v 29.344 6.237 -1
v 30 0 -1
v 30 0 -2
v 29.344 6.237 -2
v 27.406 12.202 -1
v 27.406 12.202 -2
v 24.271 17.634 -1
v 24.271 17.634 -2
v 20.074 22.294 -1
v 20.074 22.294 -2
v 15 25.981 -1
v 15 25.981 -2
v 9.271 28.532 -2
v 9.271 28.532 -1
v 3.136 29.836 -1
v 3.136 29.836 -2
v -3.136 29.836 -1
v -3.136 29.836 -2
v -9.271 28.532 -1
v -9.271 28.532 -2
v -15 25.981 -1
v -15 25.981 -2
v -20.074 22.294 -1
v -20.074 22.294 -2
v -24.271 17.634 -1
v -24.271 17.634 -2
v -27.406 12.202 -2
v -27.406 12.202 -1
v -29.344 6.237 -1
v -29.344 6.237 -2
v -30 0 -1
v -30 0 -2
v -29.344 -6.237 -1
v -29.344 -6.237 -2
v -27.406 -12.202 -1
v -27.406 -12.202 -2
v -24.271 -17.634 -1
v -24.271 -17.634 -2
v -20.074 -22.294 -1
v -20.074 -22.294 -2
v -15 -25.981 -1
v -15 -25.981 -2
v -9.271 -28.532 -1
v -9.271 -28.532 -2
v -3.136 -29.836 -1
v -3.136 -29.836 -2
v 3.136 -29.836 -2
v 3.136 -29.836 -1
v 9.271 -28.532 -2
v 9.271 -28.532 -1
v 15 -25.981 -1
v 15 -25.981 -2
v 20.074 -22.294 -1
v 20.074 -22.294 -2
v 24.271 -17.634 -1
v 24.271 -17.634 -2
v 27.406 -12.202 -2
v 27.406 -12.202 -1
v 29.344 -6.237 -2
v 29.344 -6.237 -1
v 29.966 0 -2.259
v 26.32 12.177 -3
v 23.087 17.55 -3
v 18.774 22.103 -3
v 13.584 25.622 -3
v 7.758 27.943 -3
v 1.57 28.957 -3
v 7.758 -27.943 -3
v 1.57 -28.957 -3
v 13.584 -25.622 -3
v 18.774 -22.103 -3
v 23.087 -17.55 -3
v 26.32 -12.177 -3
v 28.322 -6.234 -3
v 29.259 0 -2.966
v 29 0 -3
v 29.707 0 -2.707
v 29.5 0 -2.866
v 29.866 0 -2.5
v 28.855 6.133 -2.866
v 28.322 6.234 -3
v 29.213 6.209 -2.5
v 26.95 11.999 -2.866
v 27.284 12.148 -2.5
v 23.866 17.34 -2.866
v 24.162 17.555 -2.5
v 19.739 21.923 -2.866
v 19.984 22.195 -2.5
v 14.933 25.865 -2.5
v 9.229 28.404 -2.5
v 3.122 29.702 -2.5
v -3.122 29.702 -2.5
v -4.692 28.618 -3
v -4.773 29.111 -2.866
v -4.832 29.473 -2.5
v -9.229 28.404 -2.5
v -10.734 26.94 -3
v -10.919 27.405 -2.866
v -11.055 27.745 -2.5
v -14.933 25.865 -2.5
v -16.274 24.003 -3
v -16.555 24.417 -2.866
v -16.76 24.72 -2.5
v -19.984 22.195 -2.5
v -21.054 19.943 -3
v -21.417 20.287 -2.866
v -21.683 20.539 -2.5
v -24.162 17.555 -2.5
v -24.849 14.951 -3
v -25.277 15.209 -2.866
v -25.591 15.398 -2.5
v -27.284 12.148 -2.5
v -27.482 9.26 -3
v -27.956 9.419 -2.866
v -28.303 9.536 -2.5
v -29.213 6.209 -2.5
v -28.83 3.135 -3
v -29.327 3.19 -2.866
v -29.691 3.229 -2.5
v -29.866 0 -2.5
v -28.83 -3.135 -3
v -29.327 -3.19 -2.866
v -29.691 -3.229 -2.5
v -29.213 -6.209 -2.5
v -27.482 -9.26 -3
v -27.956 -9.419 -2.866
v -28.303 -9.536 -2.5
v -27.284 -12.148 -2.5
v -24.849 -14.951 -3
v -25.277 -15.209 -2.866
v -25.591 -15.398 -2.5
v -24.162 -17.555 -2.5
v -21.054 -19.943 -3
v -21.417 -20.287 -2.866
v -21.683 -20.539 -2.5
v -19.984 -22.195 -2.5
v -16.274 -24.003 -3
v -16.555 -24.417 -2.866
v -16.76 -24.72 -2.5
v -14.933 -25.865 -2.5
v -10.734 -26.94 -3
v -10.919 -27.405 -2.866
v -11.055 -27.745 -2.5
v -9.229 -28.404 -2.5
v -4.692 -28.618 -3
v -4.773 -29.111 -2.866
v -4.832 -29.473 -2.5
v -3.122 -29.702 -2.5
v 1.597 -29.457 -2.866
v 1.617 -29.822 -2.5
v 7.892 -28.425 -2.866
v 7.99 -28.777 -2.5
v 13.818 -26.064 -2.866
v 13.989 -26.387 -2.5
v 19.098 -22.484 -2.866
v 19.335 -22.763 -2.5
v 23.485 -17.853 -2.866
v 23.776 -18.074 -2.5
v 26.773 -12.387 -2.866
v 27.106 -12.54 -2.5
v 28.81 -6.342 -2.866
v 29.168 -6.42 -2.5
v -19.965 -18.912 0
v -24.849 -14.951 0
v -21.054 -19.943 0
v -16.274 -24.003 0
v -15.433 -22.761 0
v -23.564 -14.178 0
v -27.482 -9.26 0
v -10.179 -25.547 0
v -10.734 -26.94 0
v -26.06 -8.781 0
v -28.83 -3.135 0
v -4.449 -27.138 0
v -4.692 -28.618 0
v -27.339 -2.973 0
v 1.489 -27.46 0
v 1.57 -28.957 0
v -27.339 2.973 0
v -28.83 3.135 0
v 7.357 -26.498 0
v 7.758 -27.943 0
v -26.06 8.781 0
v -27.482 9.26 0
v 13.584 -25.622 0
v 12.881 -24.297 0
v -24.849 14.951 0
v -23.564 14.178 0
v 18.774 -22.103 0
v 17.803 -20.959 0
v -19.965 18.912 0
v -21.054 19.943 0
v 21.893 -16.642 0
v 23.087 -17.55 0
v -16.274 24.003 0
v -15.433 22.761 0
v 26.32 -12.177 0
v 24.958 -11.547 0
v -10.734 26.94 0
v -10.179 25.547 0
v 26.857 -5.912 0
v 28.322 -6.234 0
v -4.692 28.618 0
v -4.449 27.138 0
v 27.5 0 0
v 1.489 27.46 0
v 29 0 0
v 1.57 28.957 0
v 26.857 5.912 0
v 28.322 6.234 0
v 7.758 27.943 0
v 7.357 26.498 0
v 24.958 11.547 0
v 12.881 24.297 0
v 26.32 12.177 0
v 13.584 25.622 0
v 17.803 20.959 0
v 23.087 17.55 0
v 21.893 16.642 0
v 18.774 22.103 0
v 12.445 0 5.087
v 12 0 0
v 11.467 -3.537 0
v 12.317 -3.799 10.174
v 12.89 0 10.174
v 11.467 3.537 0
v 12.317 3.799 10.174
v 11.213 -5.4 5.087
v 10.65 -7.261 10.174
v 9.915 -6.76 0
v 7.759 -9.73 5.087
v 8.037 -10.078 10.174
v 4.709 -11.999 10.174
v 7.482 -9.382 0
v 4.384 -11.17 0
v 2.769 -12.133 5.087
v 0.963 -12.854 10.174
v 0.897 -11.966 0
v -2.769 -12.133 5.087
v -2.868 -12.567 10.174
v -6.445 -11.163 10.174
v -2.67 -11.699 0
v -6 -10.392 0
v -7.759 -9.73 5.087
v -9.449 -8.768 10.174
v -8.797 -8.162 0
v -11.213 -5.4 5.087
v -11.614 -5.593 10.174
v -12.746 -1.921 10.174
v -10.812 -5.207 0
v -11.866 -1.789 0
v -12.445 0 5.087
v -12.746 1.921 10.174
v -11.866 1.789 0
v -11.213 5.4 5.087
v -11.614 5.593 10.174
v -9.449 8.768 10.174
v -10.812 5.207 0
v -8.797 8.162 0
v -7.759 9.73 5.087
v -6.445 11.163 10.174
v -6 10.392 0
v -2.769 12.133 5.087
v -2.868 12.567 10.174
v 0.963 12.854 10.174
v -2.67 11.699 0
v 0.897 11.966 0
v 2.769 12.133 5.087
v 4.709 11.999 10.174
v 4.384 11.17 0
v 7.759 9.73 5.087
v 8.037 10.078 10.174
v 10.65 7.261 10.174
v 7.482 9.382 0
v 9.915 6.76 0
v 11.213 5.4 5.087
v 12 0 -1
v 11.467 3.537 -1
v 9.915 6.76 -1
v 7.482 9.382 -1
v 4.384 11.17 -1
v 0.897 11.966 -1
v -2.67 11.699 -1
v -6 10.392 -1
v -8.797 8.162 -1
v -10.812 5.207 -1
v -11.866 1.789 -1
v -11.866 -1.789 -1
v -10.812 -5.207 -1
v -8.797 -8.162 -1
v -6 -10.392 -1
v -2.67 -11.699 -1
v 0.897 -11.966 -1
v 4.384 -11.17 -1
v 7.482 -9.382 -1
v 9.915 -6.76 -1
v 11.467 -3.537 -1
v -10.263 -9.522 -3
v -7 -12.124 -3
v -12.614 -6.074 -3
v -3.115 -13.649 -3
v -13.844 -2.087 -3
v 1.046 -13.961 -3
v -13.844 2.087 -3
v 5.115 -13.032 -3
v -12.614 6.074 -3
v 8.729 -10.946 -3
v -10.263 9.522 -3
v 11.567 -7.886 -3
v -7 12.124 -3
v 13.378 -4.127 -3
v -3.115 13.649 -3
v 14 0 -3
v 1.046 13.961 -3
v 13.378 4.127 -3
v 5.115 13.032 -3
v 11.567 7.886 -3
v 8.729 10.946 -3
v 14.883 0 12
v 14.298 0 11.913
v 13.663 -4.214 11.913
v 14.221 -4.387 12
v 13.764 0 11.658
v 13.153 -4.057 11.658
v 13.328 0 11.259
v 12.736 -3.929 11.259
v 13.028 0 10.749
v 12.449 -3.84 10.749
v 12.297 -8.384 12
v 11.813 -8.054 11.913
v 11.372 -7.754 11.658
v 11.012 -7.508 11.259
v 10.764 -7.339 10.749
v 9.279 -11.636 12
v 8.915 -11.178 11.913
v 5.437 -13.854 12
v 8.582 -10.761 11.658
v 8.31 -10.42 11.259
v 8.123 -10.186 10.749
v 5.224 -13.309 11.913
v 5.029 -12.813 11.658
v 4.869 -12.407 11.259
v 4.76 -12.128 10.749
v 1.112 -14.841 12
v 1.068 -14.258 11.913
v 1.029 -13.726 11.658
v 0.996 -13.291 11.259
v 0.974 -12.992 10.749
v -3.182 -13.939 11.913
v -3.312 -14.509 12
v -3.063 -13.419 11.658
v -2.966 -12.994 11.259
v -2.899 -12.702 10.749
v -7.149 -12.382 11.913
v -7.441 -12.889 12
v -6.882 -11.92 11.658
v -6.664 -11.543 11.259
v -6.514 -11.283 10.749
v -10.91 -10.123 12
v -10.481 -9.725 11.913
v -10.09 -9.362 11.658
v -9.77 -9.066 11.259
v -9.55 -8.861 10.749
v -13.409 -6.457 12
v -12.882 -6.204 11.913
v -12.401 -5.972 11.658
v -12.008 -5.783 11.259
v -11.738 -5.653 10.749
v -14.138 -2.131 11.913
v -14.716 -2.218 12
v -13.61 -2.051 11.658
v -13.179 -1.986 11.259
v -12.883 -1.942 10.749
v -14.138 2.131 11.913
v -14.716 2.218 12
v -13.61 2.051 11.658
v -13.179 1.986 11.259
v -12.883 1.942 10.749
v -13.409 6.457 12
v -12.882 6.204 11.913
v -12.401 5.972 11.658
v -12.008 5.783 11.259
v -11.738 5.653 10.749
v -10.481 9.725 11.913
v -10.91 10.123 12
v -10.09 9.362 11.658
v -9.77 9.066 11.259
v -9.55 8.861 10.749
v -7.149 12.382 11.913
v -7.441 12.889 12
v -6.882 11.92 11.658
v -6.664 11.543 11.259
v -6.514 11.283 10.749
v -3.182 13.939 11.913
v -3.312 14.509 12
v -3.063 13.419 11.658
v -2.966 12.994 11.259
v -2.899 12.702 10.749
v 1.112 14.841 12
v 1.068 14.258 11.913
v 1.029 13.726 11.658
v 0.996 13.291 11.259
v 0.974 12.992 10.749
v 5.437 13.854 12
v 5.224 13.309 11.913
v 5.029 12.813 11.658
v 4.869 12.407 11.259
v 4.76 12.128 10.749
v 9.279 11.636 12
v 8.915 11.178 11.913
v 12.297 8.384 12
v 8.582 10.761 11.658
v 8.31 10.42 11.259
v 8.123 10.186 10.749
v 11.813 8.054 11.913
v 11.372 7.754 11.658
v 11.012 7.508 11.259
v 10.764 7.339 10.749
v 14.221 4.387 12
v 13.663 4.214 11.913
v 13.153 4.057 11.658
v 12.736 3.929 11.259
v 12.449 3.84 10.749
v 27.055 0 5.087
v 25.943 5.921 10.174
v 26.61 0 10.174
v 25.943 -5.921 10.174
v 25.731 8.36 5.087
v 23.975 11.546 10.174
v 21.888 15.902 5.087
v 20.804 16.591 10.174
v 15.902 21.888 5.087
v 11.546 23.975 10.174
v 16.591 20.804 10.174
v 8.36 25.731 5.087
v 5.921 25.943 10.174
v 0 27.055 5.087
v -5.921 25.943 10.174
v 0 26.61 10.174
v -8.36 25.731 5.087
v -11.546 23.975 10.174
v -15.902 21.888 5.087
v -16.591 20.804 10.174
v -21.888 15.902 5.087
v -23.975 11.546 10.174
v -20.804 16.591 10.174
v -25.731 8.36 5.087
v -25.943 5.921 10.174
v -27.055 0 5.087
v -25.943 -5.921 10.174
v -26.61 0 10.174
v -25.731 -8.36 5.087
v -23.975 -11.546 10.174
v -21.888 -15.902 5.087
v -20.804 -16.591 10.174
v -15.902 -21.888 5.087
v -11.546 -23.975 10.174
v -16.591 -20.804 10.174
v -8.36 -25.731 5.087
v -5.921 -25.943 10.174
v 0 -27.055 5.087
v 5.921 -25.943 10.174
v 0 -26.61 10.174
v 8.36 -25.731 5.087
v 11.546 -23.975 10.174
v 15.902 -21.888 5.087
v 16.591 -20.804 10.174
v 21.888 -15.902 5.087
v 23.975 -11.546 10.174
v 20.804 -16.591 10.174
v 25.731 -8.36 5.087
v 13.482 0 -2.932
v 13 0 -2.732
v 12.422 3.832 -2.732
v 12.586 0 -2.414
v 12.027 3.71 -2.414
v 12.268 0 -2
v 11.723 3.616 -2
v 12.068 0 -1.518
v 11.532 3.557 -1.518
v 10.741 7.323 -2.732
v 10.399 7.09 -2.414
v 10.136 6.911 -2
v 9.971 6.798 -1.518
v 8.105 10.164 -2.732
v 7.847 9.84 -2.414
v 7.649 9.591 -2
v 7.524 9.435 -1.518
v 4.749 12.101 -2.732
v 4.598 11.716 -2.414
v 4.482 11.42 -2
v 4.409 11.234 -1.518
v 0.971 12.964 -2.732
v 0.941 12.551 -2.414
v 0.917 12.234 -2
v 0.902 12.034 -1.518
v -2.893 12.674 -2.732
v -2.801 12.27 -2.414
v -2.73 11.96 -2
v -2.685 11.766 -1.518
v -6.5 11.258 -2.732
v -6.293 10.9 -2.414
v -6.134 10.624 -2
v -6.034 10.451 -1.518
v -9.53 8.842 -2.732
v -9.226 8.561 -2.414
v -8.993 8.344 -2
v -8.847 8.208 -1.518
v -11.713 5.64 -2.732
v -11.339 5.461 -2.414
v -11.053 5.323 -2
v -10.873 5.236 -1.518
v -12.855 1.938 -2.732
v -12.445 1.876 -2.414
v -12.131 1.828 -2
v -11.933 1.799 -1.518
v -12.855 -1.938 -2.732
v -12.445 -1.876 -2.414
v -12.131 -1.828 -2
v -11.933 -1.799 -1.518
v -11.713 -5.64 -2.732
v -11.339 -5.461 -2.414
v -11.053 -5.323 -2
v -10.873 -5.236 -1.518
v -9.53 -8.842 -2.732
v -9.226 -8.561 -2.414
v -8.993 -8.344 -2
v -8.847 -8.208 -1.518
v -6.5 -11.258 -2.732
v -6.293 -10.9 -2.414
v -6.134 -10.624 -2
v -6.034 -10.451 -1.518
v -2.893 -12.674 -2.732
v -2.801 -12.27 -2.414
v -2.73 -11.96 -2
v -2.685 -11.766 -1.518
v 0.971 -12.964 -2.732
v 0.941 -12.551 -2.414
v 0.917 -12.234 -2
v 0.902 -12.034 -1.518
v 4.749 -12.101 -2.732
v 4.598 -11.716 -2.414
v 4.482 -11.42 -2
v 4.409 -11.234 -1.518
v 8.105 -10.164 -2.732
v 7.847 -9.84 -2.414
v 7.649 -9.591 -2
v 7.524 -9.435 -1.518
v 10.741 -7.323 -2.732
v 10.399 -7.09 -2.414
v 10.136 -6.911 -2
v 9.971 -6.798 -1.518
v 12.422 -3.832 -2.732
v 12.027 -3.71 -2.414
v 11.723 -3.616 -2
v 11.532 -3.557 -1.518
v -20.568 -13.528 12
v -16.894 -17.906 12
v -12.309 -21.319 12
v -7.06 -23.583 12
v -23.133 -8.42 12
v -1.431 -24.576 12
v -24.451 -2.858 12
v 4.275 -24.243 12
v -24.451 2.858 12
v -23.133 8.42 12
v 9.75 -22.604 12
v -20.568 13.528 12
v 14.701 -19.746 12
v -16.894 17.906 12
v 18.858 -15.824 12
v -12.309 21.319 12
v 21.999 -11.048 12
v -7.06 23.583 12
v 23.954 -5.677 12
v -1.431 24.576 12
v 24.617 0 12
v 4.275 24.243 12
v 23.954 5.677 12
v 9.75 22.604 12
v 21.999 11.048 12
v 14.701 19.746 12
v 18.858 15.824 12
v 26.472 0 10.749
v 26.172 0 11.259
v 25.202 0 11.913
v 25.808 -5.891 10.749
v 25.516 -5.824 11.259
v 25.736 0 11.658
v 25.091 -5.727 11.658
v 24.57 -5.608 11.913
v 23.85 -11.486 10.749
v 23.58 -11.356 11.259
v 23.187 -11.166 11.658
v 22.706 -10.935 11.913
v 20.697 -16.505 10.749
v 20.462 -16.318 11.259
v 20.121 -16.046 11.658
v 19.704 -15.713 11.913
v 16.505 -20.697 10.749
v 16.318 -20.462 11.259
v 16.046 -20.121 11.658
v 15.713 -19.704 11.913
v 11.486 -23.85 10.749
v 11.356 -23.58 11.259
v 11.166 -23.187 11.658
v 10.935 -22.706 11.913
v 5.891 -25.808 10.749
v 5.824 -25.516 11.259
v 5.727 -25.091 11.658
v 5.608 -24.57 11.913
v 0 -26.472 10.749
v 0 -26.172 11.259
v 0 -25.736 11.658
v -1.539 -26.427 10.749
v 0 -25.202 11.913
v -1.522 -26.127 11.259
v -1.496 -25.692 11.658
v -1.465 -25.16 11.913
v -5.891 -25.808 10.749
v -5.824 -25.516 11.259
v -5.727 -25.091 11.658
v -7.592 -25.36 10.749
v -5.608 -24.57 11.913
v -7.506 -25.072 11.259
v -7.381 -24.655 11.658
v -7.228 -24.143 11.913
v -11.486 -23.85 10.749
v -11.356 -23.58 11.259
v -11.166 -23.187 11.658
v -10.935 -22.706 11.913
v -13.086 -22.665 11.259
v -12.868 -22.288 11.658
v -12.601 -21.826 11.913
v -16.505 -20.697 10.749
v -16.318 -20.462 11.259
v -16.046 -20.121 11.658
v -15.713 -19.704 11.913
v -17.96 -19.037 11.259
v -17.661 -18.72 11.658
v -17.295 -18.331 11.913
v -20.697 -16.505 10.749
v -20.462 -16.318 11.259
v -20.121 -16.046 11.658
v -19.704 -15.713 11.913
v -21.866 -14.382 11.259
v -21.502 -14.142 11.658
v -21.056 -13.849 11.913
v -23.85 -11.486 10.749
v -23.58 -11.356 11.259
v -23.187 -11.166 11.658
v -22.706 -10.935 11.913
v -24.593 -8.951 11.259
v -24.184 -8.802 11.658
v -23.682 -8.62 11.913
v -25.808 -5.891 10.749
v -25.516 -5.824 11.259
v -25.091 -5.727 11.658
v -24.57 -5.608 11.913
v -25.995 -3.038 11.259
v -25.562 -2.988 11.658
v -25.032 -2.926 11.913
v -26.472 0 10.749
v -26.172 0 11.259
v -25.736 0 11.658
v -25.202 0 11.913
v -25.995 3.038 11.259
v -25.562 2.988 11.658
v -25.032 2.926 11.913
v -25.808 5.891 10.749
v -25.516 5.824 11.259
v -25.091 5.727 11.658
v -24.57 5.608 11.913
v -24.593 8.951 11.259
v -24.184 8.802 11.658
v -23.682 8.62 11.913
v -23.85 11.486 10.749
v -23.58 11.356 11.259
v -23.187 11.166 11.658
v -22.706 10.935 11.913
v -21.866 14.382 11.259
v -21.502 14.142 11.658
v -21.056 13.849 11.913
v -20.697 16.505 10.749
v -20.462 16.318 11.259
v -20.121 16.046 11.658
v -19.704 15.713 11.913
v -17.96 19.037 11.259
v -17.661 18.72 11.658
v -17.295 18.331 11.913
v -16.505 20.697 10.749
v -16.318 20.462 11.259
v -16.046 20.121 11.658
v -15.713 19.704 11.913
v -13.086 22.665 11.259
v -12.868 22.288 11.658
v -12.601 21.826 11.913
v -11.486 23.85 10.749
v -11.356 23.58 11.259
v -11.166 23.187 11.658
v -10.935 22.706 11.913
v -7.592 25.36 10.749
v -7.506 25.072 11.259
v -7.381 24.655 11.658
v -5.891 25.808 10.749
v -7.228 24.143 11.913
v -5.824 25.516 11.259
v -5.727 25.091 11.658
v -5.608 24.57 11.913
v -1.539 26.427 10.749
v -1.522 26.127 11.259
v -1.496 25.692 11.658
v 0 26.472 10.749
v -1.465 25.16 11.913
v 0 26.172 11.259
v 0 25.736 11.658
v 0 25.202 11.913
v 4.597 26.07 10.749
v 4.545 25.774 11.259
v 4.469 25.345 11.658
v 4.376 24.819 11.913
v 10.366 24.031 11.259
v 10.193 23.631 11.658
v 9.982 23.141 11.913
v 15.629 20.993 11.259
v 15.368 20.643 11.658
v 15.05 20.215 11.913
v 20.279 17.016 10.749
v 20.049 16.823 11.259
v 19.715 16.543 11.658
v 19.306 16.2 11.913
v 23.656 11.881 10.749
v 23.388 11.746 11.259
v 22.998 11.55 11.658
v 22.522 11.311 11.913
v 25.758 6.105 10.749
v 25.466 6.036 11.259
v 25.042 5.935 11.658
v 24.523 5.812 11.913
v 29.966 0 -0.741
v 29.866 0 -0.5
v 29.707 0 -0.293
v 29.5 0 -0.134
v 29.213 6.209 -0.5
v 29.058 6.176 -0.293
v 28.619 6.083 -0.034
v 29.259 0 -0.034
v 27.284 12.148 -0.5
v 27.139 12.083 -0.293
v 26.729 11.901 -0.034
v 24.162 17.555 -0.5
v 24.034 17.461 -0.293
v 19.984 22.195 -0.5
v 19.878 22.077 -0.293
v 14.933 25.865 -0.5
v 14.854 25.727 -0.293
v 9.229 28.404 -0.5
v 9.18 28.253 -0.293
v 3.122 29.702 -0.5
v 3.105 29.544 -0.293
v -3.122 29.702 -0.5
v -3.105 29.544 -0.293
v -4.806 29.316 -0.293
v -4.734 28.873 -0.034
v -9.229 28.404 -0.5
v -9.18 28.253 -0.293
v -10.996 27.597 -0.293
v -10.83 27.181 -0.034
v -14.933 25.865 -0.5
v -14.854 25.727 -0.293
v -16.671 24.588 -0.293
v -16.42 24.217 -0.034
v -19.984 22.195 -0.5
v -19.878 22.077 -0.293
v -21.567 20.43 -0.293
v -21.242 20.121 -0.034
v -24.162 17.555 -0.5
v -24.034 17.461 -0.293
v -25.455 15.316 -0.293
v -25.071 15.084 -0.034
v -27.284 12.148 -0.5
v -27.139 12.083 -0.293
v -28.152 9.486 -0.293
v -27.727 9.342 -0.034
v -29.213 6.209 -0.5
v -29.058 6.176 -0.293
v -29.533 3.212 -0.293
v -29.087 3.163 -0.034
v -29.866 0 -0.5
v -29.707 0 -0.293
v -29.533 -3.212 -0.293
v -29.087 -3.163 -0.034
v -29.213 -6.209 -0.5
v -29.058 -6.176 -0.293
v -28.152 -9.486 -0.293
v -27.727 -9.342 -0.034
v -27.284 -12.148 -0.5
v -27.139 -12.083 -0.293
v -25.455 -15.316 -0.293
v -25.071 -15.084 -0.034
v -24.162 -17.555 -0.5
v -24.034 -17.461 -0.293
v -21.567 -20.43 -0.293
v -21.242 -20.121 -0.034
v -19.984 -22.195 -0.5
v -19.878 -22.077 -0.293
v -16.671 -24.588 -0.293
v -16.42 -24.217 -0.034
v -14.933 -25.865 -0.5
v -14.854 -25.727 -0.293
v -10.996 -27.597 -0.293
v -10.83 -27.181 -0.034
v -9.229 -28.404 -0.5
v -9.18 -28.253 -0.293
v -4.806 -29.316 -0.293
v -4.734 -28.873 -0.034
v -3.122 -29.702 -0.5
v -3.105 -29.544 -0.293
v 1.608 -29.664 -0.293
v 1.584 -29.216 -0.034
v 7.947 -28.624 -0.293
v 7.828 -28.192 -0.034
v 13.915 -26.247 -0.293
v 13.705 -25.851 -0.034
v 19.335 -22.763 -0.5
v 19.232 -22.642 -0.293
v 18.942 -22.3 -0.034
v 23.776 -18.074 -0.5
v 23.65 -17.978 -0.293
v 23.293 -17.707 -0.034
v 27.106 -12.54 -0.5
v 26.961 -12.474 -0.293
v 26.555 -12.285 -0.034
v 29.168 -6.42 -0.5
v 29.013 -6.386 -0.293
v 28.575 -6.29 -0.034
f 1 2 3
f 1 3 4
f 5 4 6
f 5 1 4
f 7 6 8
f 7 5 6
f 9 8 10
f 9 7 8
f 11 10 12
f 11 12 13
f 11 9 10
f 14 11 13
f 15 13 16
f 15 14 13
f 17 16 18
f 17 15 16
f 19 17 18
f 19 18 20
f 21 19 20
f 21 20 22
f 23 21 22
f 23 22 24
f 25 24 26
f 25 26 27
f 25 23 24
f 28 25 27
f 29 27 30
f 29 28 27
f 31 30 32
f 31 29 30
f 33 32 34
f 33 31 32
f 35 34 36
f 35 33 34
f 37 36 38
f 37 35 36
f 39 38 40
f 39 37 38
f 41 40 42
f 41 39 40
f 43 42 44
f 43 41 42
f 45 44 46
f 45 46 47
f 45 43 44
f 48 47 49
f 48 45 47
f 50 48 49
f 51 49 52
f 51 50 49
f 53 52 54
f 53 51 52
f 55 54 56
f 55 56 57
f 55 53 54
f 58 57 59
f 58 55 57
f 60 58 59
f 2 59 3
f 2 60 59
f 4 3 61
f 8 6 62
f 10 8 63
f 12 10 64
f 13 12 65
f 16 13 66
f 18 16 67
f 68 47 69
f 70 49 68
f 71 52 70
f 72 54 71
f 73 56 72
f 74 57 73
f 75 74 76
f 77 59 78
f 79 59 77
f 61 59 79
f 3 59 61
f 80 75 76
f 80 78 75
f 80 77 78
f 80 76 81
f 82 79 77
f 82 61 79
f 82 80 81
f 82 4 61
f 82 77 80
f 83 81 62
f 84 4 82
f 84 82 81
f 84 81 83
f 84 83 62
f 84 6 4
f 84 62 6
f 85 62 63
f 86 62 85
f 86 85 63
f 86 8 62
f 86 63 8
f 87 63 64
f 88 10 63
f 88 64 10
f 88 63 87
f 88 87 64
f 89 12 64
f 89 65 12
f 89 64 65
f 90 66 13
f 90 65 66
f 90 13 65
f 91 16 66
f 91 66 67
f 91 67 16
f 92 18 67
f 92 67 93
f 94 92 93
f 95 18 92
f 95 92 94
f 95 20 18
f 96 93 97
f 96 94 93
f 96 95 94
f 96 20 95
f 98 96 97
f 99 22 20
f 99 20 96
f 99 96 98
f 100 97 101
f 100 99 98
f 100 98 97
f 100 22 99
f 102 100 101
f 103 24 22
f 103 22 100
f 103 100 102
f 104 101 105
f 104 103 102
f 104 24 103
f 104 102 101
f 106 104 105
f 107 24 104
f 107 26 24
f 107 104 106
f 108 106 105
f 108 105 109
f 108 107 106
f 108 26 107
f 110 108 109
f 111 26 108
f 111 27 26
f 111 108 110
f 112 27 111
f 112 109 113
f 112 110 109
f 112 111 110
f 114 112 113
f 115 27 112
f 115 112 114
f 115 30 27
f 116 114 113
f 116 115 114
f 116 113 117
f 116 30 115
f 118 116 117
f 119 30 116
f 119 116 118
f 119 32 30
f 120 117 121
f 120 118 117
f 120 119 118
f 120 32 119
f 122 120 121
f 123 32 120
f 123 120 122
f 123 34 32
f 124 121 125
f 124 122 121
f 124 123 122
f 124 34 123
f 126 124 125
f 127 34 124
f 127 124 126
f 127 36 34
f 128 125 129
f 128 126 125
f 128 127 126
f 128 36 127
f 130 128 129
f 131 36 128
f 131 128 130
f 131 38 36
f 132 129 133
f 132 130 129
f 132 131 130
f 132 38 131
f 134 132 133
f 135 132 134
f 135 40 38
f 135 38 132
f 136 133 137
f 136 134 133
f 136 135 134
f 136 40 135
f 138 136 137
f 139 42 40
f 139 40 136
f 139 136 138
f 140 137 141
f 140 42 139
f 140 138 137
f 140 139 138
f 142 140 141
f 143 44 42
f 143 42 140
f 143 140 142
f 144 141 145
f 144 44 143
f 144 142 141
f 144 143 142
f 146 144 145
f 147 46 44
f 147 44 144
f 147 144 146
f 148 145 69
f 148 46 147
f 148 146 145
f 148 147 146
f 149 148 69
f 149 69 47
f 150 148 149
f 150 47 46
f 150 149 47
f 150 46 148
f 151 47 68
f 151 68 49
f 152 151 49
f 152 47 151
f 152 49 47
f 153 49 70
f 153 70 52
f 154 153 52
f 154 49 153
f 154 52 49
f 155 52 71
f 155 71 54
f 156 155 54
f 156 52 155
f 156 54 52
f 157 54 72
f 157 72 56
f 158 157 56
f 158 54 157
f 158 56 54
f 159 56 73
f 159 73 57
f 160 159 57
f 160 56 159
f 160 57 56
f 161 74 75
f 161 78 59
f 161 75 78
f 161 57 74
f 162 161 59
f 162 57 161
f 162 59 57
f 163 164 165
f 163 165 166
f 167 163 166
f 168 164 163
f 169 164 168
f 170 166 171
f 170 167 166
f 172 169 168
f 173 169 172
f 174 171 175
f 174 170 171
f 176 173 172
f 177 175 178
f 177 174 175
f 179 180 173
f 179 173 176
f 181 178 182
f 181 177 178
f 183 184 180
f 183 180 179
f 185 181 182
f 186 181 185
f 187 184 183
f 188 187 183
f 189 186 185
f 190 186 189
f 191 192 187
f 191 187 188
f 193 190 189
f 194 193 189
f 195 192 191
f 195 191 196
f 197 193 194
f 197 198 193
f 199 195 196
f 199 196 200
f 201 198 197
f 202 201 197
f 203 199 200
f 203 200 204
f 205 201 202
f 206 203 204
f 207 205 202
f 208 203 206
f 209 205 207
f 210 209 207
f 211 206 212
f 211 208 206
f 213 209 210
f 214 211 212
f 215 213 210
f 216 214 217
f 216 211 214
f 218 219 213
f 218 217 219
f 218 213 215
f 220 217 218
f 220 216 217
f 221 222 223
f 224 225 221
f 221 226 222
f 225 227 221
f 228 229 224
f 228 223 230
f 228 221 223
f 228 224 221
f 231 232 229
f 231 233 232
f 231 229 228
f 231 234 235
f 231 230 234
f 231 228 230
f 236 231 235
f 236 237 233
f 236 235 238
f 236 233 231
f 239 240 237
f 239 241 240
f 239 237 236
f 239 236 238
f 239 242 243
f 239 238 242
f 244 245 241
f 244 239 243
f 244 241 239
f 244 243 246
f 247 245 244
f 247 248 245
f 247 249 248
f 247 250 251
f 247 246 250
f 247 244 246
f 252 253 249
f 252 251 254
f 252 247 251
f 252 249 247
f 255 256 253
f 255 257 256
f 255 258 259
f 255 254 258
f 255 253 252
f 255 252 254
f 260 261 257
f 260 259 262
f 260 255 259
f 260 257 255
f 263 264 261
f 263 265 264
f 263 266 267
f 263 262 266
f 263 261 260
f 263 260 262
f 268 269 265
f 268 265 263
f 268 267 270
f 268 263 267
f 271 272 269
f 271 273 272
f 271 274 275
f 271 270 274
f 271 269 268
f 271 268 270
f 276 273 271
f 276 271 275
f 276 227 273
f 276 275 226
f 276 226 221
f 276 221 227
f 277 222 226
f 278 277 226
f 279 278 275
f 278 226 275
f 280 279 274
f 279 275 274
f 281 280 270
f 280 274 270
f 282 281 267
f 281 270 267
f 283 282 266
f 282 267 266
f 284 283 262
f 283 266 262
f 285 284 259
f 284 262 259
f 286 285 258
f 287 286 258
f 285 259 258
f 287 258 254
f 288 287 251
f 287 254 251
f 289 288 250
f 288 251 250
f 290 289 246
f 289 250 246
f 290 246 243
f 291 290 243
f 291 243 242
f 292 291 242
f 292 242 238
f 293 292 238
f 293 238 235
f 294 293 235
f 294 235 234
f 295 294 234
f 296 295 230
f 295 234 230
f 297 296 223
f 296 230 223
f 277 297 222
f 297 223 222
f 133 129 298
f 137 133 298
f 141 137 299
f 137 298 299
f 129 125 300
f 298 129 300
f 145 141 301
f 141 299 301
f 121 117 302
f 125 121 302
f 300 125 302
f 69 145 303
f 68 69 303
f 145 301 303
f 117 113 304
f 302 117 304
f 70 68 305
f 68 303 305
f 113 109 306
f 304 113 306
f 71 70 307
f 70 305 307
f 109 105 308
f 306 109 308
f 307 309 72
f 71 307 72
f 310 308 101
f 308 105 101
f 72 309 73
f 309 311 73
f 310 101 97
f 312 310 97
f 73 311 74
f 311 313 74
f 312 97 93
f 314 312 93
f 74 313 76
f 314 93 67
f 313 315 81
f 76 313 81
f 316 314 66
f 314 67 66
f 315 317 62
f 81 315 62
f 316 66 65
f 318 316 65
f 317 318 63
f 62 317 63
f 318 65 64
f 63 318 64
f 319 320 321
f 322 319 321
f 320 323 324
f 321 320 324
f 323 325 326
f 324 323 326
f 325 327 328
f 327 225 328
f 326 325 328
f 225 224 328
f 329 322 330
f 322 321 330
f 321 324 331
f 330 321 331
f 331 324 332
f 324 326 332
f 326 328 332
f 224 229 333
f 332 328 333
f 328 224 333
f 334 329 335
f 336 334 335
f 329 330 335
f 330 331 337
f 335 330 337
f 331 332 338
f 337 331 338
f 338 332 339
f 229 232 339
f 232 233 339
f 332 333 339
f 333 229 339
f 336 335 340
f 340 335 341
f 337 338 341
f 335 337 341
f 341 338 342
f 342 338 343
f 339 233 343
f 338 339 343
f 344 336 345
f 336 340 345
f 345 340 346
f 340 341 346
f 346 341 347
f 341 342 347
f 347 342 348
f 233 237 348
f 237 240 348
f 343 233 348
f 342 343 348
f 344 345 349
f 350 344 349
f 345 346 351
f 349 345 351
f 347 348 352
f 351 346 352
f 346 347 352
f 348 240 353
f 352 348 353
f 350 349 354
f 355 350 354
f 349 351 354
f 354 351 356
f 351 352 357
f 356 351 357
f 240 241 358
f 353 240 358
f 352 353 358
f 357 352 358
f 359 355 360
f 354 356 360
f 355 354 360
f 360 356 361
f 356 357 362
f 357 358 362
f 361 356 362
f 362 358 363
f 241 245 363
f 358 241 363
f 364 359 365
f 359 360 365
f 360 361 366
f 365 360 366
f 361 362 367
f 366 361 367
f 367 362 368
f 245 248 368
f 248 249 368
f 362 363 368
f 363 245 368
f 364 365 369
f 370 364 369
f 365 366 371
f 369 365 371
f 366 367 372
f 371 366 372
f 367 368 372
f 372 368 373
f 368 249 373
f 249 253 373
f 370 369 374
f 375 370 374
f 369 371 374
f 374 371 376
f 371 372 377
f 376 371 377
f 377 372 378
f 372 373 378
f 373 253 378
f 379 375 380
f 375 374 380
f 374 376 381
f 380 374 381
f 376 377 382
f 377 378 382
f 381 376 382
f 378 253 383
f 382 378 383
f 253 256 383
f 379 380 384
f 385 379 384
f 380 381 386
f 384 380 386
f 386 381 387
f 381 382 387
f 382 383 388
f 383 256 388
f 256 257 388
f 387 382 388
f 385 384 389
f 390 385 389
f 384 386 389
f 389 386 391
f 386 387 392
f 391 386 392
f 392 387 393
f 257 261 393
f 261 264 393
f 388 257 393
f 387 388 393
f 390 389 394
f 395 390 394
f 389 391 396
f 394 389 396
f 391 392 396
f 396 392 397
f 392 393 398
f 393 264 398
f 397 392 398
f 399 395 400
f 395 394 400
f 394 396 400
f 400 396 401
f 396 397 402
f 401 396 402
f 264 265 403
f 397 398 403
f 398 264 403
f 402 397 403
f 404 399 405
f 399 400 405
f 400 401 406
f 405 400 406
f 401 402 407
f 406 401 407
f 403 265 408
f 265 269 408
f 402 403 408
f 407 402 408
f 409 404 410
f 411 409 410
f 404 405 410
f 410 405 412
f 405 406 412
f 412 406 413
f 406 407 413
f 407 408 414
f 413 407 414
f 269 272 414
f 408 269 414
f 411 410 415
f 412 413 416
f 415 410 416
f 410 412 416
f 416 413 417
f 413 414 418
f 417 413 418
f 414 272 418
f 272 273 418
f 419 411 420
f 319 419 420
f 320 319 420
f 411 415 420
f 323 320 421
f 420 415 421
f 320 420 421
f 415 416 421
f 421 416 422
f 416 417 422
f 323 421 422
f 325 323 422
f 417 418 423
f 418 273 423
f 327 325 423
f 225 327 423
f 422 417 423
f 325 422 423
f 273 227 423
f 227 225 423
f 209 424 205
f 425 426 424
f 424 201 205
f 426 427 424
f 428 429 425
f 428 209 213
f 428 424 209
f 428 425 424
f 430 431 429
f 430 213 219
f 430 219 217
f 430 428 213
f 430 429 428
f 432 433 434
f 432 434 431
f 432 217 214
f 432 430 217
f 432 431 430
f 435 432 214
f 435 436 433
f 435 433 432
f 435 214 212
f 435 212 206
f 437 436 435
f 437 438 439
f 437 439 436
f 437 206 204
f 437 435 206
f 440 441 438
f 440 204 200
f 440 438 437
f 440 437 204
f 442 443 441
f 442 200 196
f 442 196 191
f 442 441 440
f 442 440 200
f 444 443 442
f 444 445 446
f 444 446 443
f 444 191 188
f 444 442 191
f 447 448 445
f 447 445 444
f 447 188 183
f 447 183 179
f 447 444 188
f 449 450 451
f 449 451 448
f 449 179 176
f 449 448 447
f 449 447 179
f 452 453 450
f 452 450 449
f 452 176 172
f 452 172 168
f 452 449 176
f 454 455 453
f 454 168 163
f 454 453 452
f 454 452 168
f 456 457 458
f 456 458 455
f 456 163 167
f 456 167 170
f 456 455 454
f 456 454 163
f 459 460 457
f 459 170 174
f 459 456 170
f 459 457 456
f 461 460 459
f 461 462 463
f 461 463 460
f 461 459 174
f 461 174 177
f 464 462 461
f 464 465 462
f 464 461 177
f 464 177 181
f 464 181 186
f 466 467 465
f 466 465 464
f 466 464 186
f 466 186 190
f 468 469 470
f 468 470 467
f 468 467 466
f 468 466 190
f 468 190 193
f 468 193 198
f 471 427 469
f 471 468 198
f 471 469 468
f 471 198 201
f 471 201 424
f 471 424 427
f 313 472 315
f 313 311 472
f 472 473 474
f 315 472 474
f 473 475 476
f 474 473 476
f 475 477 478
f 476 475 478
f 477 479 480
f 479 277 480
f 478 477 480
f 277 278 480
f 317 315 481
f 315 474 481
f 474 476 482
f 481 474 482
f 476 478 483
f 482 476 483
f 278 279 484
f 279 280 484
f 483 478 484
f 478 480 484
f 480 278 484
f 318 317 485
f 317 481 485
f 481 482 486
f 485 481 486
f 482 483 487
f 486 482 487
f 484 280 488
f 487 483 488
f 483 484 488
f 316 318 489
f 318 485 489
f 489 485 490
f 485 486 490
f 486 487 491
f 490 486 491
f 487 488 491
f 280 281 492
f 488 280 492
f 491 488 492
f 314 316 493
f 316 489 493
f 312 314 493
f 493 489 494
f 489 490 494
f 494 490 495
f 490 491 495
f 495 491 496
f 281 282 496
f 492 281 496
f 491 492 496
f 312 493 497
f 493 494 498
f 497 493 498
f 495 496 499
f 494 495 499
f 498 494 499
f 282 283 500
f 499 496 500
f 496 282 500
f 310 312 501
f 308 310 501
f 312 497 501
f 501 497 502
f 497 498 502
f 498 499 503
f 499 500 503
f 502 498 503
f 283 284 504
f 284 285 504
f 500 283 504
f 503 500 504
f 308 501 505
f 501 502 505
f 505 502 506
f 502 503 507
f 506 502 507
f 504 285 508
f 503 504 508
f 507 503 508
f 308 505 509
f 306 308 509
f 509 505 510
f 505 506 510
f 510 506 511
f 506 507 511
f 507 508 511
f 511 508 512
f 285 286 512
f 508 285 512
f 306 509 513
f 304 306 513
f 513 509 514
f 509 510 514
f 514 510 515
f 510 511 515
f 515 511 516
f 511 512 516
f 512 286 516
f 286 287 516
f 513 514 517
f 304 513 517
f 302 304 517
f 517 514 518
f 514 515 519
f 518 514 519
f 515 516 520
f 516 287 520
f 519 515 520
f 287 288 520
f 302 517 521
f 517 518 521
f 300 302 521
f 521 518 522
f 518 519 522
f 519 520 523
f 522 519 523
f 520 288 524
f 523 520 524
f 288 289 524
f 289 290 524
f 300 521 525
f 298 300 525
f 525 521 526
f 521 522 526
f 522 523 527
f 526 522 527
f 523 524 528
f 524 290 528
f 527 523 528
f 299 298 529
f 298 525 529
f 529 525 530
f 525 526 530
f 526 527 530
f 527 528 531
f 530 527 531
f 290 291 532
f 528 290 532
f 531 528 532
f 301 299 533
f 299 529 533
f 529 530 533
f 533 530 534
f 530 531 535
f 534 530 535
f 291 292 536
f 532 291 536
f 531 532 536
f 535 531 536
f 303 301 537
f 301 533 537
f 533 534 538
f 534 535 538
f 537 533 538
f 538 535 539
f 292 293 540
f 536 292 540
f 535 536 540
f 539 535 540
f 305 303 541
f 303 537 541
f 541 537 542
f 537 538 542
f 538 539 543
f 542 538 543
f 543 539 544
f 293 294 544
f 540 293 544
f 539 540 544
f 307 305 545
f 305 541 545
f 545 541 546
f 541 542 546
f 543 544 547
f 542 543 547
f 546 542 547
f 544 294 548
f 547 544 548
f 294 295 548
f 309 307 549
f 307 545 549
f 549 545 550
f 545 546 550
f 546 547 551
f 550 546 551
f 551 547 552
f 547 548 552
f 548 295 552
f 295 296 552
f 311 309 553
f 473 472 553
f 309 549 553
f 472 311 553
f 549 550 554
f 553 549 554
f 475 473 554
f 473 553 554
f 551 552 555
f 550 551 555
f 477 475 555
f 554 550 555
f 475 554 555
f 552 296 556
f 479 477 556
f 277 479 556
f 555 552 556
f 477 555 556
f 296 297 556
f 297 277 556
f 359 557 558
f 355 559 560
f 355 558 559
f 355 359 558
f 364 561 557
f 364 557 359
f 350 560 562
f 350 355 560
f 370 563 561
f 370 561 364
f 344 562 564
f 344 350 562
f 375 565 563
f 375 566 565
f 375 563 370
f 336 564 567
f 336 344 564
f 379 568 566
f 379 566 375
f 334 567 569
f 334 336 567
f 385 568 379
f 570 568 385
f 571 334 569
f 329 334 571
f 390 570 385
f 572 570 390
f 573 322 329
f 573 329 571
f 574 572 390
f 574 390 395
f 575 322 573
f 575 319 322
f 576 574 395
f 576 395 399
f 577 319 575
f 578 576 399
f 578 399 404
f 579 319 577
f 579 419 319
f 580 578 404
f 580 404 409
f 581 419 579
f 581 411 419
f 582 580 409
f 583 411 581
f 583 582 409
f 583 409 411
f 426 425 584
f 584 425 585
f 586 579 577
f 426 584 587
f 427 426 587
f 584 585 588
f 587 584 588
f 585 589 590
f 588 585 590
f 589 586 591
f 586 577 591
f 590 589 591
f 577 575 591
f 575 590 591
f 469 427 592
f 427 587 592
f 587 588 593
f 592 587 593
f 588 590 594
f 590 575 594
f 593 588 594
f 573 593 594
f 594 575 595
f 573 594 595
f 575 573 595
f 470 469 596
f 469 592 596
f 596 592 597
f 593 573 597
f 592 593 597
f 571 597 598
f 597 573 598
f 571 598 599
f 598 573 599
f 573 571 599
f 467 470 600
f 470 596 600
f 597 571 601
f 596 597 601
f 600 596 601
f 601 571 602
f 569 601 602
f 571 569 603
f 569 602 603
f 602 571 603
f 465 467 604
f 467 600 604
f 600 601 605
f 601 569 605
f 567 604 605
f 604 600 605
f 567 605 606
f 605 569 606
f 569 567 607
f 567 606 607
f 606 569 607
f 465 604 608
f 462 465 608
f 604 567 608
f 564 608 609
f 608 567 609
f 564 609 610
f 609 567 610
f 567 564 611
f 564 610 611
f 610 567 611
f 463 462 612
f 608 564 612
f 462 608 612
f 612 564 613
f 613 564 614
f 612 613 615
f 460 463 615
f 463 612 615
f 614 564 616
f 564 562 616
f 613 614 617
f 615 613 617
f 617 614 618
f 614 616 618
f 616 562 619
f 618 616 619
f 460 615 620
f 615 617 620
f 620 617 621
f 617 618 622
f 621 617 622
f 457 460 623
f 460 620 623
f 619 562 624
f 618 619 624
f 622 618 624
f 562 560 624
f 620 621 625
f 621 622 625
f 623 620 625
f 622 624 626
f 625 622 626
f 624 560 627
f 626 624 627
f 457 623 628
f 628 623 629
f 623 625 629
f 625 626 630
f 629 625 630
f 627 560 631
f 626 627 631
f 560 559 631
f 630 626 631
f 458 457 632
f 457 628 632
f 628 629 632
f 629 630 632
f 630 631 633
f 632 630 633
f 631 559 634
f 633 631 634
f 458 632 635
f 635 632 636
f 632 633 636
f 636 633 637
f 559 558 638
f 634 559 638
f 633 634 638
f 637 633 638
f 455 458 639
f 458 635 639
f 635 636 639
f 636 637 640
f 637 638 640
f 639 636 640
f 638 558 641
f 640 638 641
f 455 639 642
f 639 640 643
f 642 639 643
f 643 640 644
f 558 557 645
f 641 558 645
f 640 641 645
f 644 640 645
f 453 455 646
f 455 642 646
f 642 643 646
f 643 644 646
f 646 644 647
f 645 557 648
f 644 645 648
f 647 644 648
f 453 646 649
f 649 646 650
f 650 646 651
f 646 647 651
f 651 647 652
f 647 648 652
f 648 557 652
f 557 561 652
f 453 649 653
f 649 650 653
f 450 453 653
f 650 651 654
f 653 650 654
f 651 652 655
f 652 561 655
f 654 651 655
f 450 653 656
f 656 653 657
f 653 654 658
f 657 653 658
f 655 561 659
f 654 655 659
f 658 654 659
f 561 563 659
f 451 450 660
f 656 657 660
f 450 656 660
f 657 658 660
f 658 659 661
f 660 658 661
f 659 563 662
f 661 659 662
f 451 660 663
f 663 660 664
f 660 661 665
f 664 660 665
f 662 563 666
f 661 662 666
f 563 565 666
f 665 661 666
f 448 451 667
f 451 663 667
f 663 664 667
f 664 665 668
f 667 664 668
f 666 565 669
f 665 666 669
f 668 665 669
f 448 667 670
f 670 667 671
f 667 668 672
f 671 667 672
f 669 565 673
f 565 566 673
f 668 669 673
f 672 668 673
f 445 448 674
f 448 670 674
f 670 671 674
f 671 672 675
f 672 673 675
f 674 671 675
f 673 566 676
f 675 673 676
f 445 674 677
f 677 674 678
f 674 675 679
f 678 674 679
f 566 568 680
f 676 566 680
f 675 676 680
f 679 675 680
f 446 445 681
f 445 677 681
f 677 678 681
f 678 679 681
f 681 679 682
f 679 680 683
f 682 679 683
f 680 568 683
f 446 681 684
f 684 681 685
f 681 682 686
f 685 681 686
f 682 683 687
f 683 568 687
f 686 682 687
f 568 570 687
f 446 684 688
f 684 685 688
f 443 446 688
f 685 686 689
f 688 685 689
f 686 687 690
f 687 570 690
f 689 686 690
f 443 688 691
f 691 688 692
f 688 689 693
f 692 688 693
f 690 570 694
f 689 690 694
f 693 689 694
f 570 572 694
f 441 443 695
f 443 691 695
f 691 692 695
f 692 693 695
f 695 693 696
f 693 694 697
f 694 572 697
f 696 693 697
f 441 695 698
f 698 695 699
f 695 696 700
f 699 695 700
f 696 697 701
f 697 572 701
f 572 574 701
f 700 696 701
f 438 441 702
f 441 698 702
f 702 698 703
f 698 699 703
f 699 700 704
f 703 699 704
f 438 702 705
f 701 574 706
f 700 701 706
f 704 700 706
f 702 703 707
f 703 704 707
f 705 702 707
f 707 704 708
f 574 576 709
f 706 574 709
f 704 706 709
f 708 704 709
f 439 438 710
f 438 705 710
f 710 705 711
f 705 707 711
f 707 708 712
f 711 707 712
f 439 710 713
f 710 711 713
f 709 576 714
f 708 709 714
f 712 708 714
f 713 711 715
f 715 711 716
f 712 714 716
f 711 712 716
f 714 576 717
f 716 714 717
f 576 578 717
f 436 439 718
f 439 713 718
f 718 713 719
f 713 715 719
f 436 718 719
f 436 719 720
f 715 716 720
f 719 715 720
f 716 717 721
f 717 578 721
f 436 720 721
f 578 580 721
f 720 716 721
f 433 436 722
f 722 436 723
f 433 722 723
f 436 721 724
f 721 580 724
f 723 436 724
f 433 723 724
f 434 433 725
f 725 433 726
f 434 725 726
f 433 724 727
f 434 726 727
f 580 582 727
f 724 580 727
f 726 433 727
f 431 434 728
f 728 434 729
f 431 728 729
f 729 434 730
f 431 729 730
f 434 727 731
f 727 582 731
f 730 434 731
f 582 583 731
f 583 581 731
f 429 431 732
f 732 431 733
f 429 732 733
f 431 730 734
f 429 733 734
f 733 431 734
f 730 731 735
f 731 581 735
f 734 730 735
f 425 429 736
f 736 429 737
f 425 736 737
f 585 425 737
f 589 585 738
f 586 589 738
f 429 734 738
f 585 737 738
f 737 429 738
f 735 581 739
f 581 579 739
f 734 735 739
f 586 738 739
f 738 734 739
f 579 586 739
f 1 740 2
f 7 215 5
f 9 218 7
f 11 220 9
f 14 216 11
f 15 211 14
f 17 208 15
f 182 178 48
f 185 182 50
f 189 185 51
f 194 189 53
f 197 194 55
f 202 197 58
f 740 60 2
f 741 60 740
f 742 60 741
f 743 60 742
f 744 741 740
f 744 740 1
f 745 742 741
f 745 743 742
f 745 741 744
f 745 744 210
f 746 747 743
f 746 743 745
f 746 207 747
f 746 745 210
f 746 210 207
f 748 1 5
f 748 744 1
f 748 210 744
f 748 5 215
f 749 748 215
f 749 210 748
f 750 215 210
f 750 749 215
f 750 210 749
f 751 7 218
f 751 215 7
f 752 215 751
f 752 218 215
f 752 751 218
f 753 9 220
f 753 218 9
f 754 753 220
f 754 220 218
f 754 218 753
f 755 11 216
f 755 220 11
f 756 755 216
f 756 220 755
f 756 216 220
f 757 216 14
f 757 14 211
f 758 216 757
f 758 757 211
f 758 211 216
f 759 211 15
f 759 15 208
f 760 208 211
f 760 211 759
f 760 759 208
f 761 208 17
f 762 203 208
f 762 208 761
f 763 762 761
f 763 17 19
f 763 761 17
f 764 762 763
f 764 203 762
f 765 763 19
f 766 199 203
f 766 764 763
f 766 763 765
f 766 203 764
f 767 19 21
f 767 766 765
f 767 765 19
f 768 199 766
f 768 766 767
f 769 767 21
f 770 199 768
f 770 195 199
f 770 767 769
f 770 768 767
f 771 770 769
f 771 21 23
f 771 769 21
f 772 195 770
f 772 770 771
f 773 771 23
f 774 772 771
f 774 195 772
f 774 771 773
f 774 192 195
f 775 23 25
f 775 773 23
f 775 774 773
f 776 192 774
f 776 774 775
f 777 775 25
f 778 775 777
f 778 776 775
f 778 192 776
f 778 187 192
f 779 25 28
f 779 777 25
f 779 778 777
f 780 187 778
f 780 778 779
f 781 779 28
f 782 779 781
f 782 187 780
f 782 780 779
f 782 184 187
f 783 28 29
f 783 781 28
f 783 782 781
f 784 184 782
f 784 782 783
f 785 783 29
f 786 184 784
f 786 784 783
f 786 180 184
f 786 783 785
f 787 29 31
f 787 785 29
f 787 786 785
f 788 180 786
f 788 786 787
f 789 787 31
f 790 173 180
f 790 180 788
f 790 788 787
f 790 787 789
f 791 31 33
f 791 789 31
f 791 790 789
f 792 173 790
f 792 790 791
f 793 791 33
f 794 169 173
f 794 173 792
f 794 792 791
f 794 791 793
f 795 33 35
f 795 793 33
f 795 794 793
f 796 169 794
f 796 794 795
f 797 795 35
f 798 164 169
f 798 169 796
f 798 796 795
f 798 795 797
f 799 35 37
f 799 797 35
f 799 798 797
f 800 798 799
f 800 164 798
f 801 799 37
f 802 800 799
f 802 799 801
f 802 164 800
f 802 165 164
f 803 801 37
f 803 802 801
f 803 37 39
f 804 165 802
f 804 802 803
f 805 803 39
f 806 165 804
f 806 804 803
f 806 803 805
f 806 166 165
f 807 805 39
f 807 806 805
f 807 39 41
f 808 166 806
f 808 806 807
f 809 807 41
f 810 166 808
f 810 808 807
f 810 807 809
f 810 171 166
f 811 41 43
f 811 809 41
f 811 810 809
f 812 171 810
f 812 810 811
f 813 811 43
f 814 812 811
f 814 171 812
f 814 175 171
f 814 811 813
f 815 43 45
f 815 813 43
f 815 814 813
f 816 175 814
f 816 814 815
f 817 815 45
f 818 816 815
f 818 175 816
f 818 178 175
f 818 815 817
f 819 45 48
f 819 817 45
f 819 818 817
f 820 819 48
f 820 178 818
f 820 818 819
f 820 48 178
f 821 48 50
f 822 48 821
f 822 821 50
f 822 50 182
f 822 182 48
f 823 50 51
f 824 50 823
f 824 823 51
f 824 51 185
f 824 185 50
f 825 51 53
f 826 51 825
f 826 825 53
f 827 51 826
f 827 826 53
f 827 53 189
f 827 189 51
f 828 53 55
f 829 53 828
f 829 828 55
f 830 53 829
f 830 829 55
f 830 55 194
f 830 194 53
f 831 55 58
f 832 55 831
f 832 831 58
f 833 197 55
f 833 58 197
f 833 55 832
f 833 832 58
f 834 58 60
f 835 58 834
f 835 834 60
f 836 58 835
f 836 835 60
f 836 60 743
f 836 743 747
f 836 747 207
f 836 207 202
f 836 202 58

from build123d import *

# Parameters (mm, degrees)
F0_R     = 27.5
F0_R_2   = 12
F1_DEPTH = 12
F1_TAPER = 5
F2_R     = 30
F2_R_2   = 12
F3_DEPTH = 3
F4_R     = 2
F5_R     = 1


with BuildPart() as f1:
    # F0 (on Top) → F1 (new body)
    with BuildSketch(Plane.XY):
        Circle(F0_R)
        Circle(F0_R_2, mode=Mode.SUBTRACT)
    extrude(amount=F1_DEPTH, taper=F1_TAPER)

    # F2 (on Top) → F3 (join)
    with BuildSketch(Plane.XY):
        Circle(F2_R)
        Circle(F2_R_2, mode=Mode.SUBTRACT)
    extrude(amount=-F3_DEPTH)

    # F4
    f4_edges = [f1.edges().sort_by_distance(p)[0] for p in [
        (-26.450136, 0, 12),
        (-12, 0, -3),
        (-13.049864, 0, 12),
    ]]
    fillet(f4_edges, radius=F4_R)

    # F5
    f5_edges = [f1.edges().sort_by_distance(p)[0] for p in [
        (-30, 0, -3),
        (-30, 0, 0),
    ]]
    fillet(f5_edges, radius=F5_R)


solid = f1.part
